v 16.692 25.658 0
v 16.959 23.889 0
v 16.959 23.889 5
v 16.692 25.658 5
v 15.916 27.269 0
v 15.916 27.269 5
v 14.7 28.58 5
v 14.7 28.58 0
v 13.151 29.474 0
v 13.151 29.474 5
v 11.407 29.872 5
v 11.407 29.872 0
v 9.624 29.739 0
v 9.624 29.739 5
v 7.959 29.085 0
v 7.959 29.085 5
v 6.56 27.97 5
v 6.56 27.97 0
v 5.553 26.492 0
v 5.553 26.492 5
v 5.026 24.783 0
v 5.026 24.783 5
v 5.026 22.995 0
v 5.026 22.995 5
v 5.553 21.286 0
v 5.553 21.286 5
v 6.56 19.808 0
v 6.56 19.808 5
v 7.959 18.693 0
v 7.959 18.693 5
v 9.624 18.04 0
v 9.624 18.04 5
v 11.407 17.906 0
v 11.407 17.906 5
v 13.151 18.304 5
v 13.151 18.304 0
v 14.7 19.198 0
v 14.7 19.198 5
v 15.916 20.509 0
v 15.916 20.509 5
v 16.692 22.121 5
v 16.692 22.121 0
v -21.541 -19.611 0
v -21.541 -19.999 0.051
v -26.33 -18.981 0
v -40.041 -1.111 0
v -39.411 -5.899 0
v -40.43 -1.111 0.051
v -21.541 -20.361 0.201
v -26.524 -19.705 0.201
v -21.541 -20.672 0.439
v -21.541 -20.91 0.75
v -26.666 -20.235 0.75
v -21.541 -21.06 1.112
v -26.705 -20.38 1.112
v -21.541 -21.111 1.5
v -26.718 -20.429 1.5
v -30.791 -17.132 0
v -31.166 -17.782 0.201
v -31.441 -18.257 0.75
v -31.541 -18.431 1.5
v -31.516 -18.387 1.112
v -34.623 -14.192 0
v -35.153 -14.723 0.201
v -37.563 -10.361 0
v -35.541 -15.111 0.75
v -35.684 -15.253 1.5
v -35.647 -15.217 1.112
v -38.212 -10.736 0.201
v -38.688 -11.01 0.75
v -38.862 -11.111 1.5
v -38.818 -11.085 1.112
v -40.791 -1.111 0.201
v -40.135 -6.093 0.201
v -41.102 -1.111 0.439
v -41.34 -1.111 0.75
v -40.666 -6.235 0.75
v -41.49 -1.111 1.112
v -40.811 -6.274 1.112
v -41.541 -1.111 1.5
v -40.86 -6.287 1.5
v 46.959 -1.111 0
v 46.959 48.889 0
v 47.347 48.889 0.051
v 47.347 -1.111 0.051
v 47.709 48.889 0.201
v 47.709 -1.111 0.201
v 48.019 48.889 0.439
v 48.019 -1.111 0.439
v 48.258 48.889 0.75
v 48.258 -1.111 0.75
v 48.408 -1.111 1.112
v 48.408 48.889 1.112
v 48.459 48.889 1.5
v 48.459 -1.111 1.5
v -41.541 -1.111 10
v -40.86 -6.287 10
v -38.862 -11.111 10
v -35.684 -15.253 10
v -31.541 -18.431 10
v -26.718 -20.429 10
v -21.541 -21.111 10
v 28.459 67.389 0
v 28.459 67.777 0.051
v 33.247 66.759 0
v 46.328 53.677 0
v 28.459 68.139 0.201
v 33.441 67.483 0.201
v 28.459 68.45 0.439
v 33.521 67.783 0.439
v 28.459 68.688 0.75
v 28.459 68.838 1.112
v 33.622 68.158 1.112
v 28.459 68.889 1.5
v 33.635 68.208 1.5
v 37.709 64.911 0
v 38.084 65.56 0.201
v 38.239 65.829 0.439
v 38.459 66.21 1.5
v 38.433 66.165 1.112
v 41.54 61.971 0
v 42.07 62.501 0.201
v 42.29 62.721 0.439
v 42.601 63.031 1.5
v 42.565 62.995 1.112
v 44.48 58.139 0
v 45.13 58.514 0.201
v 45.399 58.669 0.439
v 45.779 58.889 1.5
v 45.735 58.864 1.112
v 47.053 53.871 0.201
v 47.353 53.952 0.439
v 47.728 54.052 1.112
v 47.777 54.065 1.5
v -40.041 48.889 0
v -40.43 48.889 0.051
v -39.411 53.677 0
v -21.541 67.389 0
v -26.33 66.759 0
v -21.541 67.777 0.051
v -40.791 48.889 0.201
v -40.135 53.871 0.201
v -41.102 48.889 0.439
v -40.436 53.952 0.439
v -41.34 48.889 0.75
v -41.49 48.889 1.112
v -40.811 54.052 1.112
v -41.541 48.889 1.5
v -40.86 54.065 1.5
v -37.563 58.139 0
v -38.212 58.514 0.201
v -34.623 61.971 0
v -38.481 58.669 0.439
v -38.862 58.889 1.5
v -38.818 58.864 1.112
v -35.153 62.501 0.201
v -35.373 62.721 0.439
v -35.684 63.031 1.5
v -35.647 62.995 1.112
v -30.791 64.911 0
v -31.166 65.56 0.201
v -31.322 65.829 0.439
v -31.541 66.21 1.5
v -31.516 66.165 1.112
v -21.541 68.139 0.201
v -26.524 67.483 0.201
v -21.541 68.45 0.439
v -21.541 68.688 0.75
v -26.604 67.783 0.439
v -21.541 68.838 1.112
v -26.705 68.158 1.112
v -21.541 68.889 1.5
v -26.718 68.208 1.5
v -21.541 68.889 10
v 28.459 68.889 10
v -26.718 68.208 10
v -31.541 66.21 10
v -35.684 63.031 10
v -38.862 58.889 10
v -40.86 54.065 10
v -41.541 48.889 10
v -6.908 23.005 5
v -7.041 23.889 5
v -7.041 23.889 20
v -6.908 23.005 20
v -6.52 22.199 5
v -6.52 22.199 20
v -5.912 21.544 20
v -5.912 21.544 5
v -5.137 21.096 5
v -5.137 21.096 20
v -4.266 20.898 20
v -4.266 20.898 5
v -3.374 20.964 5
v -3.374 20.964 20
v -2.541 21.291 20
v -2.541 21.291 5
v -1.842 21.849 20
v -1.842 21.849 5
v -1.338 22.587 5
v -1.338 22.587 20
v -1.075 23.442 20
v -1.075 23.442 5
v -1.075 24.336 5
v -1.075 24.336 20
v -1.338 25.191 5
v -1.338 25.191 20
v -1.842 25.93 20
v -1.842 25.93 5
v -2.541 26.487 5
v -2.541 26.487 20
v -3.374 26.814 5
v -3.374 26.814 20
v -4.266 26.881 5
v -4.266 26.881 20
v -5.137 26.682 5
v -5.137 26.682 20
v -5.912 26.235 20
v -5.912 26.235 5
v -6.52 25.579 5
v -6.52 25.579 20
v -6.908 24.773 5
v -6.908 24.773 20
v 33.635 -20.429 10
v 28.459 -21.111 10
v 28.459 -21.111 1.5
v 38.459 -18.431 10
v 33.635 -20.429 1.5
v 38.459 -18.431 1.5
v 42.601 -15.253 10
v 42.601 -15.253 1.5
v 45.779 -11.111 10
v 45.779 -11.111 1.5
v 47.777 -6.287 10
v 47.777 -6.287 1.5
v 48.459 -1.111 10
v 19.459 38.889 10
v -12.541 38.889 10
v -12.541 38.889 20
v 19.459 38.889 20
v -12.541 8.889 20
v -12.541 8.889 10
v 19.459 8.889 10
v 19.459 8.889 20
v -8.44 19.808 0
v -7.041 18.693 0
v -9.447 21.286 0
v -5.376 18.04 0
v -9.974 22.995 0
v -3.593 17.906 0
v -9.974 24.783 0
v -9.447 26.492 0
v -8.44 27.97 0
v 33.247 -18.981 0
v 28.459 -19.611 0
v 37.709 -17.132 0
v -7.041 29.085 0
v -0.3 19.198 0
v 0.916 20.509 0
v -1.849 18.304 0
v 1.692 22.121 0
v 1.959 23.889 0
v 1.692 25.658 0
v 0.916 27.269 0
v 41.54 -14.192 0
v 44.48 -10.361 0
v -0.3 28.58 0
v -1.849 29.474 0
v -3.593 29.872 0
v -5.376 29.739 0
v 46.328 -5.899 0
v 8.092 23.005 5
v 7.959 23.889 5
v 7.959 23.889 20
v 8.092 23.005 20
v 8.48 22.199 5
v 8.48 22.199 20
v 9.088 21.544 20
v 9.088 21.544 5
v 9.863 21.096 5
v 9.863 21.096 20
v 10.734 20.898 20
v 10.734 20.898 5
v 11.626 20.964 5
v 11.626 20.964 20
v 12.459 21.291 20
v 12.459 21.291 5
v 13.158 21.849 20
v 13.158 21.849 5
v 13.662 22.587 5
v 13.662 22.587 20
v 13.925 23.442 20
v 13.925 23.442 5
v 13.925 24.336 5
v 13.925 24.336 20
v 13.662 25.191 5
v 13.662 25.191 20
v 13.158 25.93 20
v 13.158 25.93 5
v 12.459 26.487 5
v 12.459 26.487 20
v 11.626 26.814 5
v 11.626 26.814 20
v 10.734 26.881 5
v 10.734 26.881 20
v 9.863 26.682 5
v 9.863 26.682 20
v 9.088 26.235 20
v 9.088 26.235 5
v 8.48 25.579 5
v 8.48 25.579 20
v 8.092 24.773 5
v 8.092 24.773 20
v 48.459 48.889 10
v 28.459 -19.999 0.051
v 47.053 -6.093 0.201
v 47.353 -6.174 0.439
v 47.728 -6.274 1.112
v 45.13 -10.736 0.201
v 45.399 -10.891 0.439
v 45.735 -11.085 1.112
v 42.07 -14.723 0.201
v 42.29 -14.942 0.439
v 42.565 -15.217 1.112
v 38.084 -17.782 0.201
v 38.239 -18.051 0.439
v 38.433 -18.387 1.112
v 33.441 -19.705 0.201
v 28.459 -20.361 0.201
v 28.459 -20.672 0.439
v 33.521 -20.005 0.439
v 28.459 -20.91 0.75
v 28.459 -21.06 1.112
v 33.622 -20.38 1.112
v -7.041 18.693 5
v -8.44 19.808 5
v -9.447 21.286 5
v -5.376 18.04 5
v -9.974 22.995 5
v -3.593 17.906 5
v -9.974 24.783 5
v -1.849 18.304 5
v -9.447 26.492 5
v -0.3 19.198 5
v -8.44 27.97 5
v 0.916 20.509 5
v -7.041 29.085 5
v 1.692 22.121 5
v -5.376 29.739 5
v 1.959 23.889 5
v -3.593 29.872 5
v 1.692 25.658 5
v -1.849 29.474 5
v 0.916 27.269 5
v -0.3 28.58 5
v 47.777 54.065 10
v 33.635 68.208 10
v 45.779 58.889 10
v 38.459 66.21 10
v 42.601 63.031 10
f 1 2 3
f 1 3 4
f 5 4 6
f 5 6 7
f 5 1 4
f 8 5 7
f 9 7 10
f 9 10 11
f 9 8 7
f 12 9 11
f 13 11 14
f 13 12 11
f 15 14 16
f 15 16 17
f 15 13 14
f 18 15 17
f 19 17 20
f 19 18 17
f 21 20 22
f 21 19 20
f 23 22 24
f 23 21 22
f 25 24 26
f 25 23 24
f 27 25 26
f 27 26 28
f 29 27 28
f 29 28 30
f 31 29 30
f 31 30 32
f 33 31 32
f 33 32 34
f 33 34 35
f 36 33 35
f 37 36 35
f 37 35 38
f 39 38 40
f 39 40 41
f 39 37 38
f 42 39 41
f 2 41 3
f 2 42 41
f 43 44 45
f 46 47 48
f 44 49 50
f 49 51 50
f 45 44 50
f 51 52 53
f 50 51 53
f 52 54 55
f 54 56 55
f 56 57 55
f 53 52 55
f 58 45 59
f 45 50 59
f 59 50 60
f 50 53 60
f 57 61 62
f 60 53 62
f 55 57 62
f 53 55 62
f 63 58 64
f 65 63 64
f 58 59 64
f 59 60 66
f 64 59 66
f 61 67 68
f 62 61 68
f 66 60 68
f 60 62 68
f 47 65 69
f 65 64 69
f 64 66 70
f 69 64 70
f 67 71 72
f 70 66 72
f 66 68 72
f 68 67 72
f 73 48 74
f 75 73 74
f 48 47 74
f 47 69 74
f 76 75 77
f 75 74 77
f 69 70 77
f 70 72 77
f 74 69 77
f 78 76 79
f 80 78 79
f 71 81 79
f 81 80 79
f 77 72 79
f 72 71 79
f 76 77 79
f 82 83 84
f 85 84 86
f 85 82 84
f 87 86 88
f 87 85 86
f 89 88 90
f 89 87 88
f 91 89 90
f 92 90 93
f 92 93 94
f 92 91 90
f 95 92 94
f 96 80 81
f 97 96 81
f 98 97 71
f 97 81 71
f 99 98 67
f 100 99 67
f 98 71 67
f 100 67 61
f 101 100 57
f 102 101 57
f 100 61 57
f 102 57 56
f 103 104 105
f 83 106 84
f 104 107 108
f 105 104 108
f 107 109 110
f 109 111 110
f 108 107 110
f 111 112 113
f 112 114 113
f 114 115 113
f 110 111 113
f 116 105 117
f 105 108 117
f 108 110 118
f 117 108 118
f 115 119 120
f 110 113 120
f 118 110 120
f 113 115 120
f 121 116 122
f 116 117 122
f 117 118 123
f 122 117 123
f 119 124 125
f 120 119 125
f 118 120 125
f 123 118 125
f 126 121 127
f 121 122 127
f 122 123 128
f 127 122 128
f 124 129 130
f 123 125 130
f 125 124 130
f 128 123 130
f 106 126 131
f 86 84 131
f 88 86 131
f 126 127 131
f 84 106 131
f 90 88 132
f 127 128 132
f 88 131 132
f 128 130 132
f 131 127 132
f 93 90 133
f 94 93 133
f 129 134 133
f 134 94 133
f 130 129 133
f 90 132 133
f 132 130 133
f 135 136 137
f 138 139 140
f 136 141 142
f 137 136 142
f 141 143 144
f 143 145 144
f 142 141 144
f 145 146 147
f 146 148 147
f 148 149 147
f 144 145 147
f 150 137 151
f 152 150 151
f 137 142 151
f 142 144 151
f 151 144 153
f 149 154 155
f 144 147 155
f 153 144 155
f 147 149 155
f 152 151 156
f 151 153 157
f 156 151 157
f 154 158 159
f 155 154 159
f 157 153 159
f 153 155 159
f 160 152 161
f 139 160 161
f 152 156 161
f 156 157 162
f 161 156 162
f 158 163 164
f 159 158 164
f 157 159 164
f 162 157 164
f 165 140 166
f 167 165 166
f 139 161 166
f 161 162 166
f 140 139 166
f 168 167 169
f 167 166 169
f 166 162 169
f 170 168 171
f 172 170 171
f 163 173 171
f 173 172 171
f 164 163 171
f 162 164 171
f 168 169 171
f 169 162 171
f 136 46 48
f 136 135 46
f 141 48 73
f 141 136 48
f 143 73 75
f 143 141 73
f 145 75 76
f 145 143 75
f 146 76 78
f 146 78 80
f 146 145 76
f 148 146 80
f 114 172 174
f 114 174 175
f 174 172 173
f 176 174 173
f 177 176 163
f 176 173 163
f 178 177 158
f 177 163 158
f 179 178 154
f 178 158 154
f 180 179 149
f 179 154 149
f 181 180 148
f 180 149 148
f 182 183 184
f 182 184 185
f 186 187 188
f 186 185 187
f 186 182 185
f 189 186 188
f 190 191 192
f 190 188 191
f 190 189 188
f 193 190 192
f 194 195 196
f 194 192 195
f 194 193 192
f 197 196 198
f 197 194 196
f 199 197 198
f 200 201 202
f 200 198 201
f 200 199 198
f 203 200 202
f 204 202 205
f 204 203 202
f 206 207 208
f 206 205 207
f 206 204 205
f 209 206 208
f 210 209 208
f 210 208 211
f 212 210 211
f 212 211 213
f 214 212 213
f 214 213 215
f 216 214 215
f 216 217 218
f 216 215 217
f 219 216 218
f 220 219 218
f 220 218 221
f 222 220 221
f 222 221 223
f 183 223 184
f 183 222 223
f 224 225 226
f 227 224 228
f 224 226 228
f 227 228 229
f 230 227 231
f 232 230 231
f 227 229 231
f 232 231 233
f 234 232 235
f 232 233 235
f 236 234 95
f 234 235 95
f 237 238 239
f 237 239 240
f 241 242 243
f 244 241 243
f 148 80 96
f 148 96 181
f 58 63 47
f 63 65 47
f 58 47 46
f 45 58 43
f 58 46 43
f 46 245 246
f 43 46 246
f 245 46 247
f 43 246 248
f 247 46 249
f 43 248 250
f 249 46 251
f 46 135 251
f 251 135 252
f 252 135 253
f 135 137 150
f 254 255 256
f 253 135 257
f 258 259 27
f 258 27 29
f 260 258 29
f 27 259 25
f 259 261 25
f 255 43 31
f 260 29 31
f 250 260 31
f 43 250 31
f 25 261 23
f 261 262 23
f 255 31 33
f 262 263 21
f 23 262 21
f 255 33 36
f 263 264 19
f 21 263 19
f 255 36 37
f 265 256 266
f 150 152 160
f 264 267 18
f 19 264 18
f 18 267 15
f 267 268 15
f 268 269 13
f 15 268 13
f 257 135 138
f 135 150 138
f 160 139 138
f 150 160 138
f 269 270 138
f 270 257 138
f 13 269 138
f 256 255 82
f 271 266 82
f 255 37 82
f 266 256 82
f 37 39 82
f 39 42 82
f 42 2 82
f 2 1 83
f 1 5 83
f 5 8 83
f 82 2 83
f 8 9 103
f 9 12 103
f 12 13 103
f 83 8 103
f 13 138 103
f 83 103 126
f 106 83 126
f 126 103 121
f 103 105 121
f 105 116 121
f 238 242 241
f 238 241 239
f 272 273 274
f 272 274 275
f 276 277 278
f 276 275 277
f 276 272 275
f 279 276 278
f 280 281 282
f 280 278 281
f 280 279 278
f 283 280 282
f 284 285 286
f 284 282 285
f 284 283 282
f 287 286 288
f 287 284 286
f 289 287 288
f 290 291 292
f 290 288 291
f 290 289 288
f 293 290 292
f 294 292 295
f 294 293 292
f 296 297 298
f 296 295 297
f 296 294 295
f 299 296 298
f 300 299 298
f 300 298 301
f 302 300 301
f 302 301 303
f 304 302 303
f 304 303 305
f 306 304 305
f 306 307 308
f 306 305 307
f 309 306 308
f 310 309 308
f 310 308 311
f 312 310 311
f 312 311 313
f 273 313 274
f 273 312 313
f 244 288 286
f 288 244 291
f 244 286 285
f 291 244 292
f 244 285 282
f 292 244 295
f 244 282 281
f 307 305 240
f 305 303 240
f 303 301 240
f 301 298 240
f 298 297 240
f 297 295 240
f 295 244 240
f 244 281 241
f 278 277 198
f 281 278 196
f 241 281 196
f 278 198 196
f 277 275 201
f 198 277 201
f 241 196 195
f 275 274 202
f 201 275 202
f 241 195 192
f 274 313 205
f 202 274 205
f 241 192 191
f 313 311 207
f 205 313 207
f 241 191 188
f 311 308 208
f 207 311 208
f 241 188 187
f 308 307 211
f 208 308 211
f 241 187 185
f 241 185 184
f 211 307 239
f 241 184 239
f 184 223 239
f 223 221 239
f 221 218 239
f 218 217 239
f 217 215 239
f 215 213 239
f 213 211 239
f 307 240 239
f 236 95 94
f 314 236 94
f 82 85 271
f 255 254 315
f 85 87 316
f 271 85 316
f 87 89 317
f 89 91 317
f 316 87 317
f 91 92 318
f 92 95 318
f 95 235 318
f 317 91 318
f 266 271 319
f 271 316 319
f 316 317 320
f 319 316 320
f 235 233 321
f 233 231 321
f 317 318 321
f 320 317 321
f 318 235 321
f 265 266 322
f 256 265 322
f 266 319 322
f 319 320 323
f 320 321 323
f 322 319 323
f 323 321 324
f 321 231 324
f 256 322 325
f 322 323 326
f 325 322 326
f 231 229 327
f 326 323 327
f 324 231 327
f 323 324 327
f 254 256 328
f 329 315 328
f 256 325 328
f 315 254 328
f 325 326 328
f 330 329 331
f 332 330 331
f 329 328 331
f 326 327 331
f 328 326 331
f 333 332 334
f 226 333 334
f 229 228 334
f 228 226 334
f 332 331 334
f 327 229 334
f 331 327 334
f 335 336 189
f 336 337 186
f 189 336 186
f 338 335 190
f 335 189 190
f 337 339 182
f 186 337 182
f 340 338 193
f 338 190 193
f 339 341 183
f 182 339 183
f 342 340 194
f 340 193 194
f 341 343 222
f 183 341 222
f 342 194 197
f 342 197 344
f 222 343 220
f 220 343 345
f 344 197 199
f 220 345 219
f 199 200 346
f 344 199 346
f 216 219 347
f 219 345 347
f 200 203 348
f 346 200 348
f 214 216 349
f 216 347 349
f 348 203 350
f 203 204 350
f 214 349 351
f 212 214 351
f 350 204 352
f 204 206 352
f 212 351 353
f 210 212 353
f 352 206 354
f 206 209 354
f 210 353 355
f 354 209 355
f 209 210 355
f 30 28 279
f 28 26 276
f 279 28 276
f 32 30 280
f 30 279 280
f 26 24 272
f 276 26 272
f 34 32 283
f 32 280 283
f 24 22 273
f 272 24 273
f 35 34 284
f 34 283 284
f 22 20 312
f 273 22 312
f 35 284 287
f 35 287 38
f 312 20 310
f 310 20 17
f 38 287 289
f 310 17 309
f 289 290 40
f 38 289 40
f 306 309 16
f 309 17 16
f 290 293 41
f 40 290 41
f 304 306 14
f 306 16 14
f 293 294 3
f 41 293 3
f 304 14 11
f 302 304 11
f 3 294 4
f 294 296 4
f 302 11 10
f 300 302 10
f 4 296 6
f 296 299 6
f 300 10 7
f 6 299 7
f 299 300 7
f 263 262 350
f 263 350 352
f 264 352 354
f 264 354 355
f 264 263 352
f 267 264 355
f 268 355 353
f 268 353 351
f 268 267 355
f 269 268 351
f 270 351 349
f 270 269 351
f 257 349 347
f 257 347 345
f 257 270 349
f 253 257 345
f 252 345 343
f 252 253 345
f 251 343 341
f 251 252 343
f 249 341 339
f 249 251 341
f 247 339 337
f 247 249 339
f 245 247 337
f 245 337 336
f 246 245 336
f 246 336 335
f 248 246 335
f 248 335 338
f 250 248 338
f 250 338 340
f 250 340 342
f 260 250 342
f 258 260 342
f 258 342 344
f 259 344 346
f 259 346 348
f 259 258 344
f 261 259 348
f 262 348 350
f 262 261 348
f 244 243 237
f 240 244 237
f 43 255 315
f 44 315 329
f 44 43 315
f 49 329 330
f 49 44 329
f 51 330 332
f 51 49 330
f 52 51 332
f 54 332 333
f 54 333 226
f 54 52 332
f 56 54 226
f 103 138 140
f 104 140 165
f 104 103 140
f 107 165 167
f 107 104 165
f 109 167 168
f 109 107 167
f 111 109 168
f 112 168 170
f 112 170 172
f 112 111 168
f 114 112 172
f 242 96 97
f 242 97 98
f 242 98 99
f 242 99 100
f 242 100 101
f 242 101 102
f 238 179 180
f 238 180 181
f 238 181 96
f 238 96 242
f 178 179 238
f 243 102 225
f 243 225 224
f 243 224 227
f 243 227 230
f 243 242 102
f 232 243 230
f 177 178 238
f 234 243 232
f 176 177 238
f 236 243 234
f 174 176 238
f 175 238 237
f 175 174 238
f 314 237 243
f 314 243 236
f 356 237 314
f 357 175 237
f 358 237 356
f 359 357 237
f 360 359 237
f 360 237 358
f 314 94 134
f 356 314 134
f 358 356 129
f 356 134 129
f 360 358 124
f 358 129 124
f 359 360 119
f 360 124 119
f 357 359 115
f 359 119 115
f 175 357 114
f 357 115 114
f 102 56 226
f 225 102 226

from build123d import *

# Parameters (mm, degrees)
Y_KSEKLIK_EKSTR_ZYON1_DEPTH = 20
CUT_EXTRUDE1_DEPTH          = 44
CUT_EXTRUDE1_DEPTH_BACK     = 10
SKETCH1_R                   = 2.5
SKETCH2_W                   = 32
SKETCH2_H                   = 30
CUT_EXTRUDE3_DEPTH          = 27
SKETCH3_W                   = 32
SKETCH3_H                   = 30
BOSS_EXTRUDE1_DEPTH         = 16
CUT_EXTRUDE4_DEPTH          = 4
SKETCH5_W                   = 33.515954684
SKETCH5_H                   = 18.308274805
BOSS_EXTRUDE2_DEPTH         = 10
CUT_EXTRUDE5_DEPTH          = 53
CUT_EXTRUDE5_DEPTH_BACK     = 25
SKETCH6_R                   = 2.5
SKETCH7_W                   = 36.495036791
SKETCH7_H                   = 91.485439351
SKETCH7_W_2                 = 38.306268879
CUT_EXTRUDE7_DEPTH          = 30
SKETCH8_W                   = 29
SKETCH8_H                   = 90
BOSS_EXTRUDE3_DEPTH         = 10
CUT_EXTRUDE8_DEPTH          = 10
SKETCH10_W                  = 32
SKETCH10_H                  = 30
CUT_EXTRUDE9_DEPTH          = 28
SKETCH11_W                  = 32
SKETCH11_H                  = 30
BOSS_EXTRUDE4_DEPTH         = 10
SKETCH12_R                  = 3
CUT_EXTRUDE10_DEPTH         = 22
SKETCH13_R                  = 6
CUT_EXTRUDE11_DEPTH         = 5
FILLET1_R                   = 1.5


with BuildPart() as part:
    # Çizim1 → Yükseklik-Ekstrüzyon1 (new body)
    with BuildSketch(Plane.XY):
        with BuildLine():
            Line((-41.541366964, -1.110887656), (-41.541366964, 48.889112344))
            ThreePointArc((-41.541366964, 48.889112344), (-35.683502588, 63.031247968), (-21.541366964, 68.889112344))
            Line((-21.541366964, 68.889112344), (28.458633036, 68.889112344))
            ThreePointArc((28.458633036, 68.889112344), (42.600768659, 63.031247968), (48.458633036, 48.889112344))
            Line((48.458633036, 48.889112344), (48.458633036, -1.110887656))
            ThreePointArc((48.458633036, -1.110887656), (42.600768659, -15.25302328), (28.458633036, -21.110887656))
            Line((28.458633036, -21.110887656), (-21.541366964, -21.110887656))
            ThreePointArc((-21.541366964, -21.110887656), (-35.683502588, -15.25302328), (-41.541366964, -1.110887656))
        make_face()
    extrude(amount=Y_KSEKLIK_EKSTR_ZYON1_DEPTH)

    # Sketch1 → Cut-Extrude1 (cut, two sides: drawn at the far end of the back side and taken through both)
    with BuildSketch(Plane.XY.offset(-CUT_EXTRUDE1_DEPTH_BACK)):
        with Locations(Location((-4.041366964, 23.889112344, 0), (0, 0, 180))):
            Circle(SKETCH1_R)
        with Locations(Location((10.958633036, 23.889112344, 0), (0, 0, 180))):
            Circle(SKETCH1_R)
    extrude(amount=CUT_EXTRUDE1_DEPTH + CUT_EXTRUDE1_DEPTH_BACK, mode=Mode.SUBTRACT)

    # Sketch2 → Cut-Extrude3 (cut)
    with BuildSketch(Plane.XY):
        with Locations((3.458633036, 53.889112344)):
            Rectangle(SKETCH2_W, SKETCH2_H)
    extrude(amount=CUT_EXTRUDE3_DEPTH, mode=Mode.SUBTRACT)

    # Sketch3 → Boss-Extrude1 (add)
    with BuildSketch(Plane.XY):
        with Locations((3.458633036, 53.889112344)):
            Rectangle(SKETCH3_W, SKETCH3_H)
    extrude(amount=BOSS_EXTRUDE1_DEPTH)

    # Sketch4 → Cut-Extrude4 (cut)
    with BuildSketch(Plane.XY):
        Polygon((15.692905243, 23.889112344), (13.325769139, 27.989112344), (8.591496932, 27.989112344), (6.224360828, 23.889112344), (8.591496932, 19.789112344), (13.325769139, 19.789112344), align=None)
        Polygon((0.692905243, 23.889112344), (-1.674230861, 27.989112344), (-6.408503068, 27.989112344), (-8.775639172, 23.889112344), (-6.408503068, 19.789112344), (-1.674230861, 19.789112344), align=None)
    extrude(amount=CUT_EXTRUDE4_DEPTH, mode=Mode.SUBTRACT)

    # Sketch5 → Boss-Extrude2 (add)
    with BuildSketch(Plane.XY):
        with Locations((2.203630327, 23.667641278)):
            Rectangle(SKETCH5_W, SKETCH5_H)
    extrude(amount=BOSS_EXTRUDE2_DEPTH)

    # Sketch6 → Cut-Extrude5 (cut, two sides: drawn at the far end of the back side and taken through both)
    with BuildSketch(Plane.XY.offset(-CUT_EXTRUDE5_DEPTH_BACK)):
        with Locations(Location((-4.041366964, 23.889112344, 0), (0, 0, 180))):
            Circle(SKETCH6_R)
        with Locations(Location((10.958633036, 23.889112344, 0), (0, 0, 180))):
            Circle(SKETCH6_R)
    extrude(amount=CUT_EXTRUDE5_DEPTH + CUT_EXTRUDE5_DEPTH_BACK, mode=Mode.SUBTRACT)

    # Sketch7 → Cut-Extrude7 (cut)
    with BuildSketch(Plane.XY):
        with Locations((-30.78888536, 23.146392668)):
            Rectangle(SKETCH7_W, SKETCH7_H)
        with Locations((38.611767476, 23.146392668)):
            Rectangle(SKETCH7_W_2, SKETCH7_H)
    extrude(amount=CUT_EXTRUDE7_DEPTH, mode=Mode.SUBTRACT)

    # Sketch8 → Boss-Extrude3 (add)
    with BuildSketch(Plane.XY):
        with Locations((-27.041366964, 23.889112344)):
            Rectangle(SKETCH8_W, SKETCH8_H)
        with Locations((33.958633036, 23.889112344)):
            Rectangle(SKETCH8_W, SKETCH8_H)
    extrude(amount=BOSS_EXTRUDE3_DEPTH)

    # Sketch9 → Cut-Extrude8 (cut)
    with BuildSketch(Plane.XY):
        with BuildLine():
            Line((-41.541366964, 68.889112344), (-21.541366964, 68.889112344))
            ThreePointArc((-21.541366964, 68.889112344), (-35.683502588, 63.031247968), (-41.541366964, 48.889112344))
            Line((-41.541366964, 48.889112344), (-41.541366964, 68.889112344))
        make_face()
        with BuildLine():
            Line((48.458633036, 68.889112344), (48.458633036, 48.889112344))
            ThreePointArc((48.458633036, 48.889112344), (42.600768659, 63.031247968), (28.458633036, 68.889112344))
            Line((28.458633036, 68.889112344), (48.458633036, 68.889112344))
        make_face()
        with BuildLine():
            Line((48.458633036, -21.110887656), (28.458633036, -21.110887656))
            ThreePointArc((28.458633036, -21.110887656), (42.600768659, -15.25302328), (48.458633036, -1.110887656))
            Line((48.458633036, -1.110887656), (48.458633036, -21.110887656))
        make_face()
        with BuildLine():
            Line((-41.541366964, -21.110887656), (-41.541366964, -1.110887656))
            ThreePointArc((-41.541366964, -1.110887656), (-35.683502588, -15.25302328), (-21.541366964, -21.110887656))
            Line((-21.541366964, -21.110887656), (-41.541366964, -21.110887656))
        make_face()
    extrude(amount=CUT_EXTRUDE8_DEPTH, mode=Mode.SUBTRACT)

    # Sketch10 → Cut-Extrude9 (cut)
    with BuildSketch(Plane.XY):
        with Locations((3.458633036, 53.889112344)):
            Rectangle(SKETCH10_W, SKETCH10_H)
        with Locations((3.458633036, -6.110887656)):
            Rectangle(SKETCH10_W, SKETCH10_H)
    extrude(amount=CUT_EXTRUDE9_DEPTH, mode=Mode.SUBTRACT)

    # Sketch11 → Boss-Extrude4 (add)
    with BuildSketch(Plane.XY):
        with Locations((3.458633036, 53.889112344)):
            Rectangle(SKETCH11_W, SKETCH11_H)
        with Locations((3.458633036, -6.110887656)):
            Rectangle(SKETCH11_W, SKETCH11_H)
    extrude(amount=BOSS_EXTRUDE4_DEPTH)

    # Sketch12 → Cut-Extrude10 (cut)
    with BuildSketch(Plane.XY):
        with Locations(Location((-4.041366964, 23.889112344, 0), (0, 0, 180))):
            Circle(SKETCH12_R)
        with Locations(Location((10.958633036, 23.889112344, 0), (0, 0, 180))):
            Circle(SKETCH12_R)
    extrude(amount=CUT_EXTRUDE10_DEPTH, mode=Mode.SUBTRACT)

    # Sketch13 → Cut-Extrude11 (cut)
    with BuildSketch(Plane.XY):
        with Locations((10.958633036, 23.889112344)):
            Circle(SKETCH13_R)
        with Locations((-4.041366964, 23.889112344)):
            Circle(SKETCH13_R)
    extrude(amount=CUT_EXTRUDE11_DEPTH, mode=Mode.SUBTRACT)

    # Fillet1
    fillet1_edges = [part.edges().sort_by_distance(p)[0] for p in [
        (-41.541366964, 23.889112344, 0),
        (-35.683502588, 63.031247968, 0),
        (3.458633036, 68.889112344, 0),
        (42.600768659, 63.031247968, 0),
        (48.458633036, 23.889112344, 0),
        (42.600768659, -15.25302328, 0),
        (3.458633036, -21.110887656, 0),
        (-35.683502588, -15.25302328, 0),
    ]]
    fillet(fillet1_edges, radius=FILLET1_R)


solid = part.part
